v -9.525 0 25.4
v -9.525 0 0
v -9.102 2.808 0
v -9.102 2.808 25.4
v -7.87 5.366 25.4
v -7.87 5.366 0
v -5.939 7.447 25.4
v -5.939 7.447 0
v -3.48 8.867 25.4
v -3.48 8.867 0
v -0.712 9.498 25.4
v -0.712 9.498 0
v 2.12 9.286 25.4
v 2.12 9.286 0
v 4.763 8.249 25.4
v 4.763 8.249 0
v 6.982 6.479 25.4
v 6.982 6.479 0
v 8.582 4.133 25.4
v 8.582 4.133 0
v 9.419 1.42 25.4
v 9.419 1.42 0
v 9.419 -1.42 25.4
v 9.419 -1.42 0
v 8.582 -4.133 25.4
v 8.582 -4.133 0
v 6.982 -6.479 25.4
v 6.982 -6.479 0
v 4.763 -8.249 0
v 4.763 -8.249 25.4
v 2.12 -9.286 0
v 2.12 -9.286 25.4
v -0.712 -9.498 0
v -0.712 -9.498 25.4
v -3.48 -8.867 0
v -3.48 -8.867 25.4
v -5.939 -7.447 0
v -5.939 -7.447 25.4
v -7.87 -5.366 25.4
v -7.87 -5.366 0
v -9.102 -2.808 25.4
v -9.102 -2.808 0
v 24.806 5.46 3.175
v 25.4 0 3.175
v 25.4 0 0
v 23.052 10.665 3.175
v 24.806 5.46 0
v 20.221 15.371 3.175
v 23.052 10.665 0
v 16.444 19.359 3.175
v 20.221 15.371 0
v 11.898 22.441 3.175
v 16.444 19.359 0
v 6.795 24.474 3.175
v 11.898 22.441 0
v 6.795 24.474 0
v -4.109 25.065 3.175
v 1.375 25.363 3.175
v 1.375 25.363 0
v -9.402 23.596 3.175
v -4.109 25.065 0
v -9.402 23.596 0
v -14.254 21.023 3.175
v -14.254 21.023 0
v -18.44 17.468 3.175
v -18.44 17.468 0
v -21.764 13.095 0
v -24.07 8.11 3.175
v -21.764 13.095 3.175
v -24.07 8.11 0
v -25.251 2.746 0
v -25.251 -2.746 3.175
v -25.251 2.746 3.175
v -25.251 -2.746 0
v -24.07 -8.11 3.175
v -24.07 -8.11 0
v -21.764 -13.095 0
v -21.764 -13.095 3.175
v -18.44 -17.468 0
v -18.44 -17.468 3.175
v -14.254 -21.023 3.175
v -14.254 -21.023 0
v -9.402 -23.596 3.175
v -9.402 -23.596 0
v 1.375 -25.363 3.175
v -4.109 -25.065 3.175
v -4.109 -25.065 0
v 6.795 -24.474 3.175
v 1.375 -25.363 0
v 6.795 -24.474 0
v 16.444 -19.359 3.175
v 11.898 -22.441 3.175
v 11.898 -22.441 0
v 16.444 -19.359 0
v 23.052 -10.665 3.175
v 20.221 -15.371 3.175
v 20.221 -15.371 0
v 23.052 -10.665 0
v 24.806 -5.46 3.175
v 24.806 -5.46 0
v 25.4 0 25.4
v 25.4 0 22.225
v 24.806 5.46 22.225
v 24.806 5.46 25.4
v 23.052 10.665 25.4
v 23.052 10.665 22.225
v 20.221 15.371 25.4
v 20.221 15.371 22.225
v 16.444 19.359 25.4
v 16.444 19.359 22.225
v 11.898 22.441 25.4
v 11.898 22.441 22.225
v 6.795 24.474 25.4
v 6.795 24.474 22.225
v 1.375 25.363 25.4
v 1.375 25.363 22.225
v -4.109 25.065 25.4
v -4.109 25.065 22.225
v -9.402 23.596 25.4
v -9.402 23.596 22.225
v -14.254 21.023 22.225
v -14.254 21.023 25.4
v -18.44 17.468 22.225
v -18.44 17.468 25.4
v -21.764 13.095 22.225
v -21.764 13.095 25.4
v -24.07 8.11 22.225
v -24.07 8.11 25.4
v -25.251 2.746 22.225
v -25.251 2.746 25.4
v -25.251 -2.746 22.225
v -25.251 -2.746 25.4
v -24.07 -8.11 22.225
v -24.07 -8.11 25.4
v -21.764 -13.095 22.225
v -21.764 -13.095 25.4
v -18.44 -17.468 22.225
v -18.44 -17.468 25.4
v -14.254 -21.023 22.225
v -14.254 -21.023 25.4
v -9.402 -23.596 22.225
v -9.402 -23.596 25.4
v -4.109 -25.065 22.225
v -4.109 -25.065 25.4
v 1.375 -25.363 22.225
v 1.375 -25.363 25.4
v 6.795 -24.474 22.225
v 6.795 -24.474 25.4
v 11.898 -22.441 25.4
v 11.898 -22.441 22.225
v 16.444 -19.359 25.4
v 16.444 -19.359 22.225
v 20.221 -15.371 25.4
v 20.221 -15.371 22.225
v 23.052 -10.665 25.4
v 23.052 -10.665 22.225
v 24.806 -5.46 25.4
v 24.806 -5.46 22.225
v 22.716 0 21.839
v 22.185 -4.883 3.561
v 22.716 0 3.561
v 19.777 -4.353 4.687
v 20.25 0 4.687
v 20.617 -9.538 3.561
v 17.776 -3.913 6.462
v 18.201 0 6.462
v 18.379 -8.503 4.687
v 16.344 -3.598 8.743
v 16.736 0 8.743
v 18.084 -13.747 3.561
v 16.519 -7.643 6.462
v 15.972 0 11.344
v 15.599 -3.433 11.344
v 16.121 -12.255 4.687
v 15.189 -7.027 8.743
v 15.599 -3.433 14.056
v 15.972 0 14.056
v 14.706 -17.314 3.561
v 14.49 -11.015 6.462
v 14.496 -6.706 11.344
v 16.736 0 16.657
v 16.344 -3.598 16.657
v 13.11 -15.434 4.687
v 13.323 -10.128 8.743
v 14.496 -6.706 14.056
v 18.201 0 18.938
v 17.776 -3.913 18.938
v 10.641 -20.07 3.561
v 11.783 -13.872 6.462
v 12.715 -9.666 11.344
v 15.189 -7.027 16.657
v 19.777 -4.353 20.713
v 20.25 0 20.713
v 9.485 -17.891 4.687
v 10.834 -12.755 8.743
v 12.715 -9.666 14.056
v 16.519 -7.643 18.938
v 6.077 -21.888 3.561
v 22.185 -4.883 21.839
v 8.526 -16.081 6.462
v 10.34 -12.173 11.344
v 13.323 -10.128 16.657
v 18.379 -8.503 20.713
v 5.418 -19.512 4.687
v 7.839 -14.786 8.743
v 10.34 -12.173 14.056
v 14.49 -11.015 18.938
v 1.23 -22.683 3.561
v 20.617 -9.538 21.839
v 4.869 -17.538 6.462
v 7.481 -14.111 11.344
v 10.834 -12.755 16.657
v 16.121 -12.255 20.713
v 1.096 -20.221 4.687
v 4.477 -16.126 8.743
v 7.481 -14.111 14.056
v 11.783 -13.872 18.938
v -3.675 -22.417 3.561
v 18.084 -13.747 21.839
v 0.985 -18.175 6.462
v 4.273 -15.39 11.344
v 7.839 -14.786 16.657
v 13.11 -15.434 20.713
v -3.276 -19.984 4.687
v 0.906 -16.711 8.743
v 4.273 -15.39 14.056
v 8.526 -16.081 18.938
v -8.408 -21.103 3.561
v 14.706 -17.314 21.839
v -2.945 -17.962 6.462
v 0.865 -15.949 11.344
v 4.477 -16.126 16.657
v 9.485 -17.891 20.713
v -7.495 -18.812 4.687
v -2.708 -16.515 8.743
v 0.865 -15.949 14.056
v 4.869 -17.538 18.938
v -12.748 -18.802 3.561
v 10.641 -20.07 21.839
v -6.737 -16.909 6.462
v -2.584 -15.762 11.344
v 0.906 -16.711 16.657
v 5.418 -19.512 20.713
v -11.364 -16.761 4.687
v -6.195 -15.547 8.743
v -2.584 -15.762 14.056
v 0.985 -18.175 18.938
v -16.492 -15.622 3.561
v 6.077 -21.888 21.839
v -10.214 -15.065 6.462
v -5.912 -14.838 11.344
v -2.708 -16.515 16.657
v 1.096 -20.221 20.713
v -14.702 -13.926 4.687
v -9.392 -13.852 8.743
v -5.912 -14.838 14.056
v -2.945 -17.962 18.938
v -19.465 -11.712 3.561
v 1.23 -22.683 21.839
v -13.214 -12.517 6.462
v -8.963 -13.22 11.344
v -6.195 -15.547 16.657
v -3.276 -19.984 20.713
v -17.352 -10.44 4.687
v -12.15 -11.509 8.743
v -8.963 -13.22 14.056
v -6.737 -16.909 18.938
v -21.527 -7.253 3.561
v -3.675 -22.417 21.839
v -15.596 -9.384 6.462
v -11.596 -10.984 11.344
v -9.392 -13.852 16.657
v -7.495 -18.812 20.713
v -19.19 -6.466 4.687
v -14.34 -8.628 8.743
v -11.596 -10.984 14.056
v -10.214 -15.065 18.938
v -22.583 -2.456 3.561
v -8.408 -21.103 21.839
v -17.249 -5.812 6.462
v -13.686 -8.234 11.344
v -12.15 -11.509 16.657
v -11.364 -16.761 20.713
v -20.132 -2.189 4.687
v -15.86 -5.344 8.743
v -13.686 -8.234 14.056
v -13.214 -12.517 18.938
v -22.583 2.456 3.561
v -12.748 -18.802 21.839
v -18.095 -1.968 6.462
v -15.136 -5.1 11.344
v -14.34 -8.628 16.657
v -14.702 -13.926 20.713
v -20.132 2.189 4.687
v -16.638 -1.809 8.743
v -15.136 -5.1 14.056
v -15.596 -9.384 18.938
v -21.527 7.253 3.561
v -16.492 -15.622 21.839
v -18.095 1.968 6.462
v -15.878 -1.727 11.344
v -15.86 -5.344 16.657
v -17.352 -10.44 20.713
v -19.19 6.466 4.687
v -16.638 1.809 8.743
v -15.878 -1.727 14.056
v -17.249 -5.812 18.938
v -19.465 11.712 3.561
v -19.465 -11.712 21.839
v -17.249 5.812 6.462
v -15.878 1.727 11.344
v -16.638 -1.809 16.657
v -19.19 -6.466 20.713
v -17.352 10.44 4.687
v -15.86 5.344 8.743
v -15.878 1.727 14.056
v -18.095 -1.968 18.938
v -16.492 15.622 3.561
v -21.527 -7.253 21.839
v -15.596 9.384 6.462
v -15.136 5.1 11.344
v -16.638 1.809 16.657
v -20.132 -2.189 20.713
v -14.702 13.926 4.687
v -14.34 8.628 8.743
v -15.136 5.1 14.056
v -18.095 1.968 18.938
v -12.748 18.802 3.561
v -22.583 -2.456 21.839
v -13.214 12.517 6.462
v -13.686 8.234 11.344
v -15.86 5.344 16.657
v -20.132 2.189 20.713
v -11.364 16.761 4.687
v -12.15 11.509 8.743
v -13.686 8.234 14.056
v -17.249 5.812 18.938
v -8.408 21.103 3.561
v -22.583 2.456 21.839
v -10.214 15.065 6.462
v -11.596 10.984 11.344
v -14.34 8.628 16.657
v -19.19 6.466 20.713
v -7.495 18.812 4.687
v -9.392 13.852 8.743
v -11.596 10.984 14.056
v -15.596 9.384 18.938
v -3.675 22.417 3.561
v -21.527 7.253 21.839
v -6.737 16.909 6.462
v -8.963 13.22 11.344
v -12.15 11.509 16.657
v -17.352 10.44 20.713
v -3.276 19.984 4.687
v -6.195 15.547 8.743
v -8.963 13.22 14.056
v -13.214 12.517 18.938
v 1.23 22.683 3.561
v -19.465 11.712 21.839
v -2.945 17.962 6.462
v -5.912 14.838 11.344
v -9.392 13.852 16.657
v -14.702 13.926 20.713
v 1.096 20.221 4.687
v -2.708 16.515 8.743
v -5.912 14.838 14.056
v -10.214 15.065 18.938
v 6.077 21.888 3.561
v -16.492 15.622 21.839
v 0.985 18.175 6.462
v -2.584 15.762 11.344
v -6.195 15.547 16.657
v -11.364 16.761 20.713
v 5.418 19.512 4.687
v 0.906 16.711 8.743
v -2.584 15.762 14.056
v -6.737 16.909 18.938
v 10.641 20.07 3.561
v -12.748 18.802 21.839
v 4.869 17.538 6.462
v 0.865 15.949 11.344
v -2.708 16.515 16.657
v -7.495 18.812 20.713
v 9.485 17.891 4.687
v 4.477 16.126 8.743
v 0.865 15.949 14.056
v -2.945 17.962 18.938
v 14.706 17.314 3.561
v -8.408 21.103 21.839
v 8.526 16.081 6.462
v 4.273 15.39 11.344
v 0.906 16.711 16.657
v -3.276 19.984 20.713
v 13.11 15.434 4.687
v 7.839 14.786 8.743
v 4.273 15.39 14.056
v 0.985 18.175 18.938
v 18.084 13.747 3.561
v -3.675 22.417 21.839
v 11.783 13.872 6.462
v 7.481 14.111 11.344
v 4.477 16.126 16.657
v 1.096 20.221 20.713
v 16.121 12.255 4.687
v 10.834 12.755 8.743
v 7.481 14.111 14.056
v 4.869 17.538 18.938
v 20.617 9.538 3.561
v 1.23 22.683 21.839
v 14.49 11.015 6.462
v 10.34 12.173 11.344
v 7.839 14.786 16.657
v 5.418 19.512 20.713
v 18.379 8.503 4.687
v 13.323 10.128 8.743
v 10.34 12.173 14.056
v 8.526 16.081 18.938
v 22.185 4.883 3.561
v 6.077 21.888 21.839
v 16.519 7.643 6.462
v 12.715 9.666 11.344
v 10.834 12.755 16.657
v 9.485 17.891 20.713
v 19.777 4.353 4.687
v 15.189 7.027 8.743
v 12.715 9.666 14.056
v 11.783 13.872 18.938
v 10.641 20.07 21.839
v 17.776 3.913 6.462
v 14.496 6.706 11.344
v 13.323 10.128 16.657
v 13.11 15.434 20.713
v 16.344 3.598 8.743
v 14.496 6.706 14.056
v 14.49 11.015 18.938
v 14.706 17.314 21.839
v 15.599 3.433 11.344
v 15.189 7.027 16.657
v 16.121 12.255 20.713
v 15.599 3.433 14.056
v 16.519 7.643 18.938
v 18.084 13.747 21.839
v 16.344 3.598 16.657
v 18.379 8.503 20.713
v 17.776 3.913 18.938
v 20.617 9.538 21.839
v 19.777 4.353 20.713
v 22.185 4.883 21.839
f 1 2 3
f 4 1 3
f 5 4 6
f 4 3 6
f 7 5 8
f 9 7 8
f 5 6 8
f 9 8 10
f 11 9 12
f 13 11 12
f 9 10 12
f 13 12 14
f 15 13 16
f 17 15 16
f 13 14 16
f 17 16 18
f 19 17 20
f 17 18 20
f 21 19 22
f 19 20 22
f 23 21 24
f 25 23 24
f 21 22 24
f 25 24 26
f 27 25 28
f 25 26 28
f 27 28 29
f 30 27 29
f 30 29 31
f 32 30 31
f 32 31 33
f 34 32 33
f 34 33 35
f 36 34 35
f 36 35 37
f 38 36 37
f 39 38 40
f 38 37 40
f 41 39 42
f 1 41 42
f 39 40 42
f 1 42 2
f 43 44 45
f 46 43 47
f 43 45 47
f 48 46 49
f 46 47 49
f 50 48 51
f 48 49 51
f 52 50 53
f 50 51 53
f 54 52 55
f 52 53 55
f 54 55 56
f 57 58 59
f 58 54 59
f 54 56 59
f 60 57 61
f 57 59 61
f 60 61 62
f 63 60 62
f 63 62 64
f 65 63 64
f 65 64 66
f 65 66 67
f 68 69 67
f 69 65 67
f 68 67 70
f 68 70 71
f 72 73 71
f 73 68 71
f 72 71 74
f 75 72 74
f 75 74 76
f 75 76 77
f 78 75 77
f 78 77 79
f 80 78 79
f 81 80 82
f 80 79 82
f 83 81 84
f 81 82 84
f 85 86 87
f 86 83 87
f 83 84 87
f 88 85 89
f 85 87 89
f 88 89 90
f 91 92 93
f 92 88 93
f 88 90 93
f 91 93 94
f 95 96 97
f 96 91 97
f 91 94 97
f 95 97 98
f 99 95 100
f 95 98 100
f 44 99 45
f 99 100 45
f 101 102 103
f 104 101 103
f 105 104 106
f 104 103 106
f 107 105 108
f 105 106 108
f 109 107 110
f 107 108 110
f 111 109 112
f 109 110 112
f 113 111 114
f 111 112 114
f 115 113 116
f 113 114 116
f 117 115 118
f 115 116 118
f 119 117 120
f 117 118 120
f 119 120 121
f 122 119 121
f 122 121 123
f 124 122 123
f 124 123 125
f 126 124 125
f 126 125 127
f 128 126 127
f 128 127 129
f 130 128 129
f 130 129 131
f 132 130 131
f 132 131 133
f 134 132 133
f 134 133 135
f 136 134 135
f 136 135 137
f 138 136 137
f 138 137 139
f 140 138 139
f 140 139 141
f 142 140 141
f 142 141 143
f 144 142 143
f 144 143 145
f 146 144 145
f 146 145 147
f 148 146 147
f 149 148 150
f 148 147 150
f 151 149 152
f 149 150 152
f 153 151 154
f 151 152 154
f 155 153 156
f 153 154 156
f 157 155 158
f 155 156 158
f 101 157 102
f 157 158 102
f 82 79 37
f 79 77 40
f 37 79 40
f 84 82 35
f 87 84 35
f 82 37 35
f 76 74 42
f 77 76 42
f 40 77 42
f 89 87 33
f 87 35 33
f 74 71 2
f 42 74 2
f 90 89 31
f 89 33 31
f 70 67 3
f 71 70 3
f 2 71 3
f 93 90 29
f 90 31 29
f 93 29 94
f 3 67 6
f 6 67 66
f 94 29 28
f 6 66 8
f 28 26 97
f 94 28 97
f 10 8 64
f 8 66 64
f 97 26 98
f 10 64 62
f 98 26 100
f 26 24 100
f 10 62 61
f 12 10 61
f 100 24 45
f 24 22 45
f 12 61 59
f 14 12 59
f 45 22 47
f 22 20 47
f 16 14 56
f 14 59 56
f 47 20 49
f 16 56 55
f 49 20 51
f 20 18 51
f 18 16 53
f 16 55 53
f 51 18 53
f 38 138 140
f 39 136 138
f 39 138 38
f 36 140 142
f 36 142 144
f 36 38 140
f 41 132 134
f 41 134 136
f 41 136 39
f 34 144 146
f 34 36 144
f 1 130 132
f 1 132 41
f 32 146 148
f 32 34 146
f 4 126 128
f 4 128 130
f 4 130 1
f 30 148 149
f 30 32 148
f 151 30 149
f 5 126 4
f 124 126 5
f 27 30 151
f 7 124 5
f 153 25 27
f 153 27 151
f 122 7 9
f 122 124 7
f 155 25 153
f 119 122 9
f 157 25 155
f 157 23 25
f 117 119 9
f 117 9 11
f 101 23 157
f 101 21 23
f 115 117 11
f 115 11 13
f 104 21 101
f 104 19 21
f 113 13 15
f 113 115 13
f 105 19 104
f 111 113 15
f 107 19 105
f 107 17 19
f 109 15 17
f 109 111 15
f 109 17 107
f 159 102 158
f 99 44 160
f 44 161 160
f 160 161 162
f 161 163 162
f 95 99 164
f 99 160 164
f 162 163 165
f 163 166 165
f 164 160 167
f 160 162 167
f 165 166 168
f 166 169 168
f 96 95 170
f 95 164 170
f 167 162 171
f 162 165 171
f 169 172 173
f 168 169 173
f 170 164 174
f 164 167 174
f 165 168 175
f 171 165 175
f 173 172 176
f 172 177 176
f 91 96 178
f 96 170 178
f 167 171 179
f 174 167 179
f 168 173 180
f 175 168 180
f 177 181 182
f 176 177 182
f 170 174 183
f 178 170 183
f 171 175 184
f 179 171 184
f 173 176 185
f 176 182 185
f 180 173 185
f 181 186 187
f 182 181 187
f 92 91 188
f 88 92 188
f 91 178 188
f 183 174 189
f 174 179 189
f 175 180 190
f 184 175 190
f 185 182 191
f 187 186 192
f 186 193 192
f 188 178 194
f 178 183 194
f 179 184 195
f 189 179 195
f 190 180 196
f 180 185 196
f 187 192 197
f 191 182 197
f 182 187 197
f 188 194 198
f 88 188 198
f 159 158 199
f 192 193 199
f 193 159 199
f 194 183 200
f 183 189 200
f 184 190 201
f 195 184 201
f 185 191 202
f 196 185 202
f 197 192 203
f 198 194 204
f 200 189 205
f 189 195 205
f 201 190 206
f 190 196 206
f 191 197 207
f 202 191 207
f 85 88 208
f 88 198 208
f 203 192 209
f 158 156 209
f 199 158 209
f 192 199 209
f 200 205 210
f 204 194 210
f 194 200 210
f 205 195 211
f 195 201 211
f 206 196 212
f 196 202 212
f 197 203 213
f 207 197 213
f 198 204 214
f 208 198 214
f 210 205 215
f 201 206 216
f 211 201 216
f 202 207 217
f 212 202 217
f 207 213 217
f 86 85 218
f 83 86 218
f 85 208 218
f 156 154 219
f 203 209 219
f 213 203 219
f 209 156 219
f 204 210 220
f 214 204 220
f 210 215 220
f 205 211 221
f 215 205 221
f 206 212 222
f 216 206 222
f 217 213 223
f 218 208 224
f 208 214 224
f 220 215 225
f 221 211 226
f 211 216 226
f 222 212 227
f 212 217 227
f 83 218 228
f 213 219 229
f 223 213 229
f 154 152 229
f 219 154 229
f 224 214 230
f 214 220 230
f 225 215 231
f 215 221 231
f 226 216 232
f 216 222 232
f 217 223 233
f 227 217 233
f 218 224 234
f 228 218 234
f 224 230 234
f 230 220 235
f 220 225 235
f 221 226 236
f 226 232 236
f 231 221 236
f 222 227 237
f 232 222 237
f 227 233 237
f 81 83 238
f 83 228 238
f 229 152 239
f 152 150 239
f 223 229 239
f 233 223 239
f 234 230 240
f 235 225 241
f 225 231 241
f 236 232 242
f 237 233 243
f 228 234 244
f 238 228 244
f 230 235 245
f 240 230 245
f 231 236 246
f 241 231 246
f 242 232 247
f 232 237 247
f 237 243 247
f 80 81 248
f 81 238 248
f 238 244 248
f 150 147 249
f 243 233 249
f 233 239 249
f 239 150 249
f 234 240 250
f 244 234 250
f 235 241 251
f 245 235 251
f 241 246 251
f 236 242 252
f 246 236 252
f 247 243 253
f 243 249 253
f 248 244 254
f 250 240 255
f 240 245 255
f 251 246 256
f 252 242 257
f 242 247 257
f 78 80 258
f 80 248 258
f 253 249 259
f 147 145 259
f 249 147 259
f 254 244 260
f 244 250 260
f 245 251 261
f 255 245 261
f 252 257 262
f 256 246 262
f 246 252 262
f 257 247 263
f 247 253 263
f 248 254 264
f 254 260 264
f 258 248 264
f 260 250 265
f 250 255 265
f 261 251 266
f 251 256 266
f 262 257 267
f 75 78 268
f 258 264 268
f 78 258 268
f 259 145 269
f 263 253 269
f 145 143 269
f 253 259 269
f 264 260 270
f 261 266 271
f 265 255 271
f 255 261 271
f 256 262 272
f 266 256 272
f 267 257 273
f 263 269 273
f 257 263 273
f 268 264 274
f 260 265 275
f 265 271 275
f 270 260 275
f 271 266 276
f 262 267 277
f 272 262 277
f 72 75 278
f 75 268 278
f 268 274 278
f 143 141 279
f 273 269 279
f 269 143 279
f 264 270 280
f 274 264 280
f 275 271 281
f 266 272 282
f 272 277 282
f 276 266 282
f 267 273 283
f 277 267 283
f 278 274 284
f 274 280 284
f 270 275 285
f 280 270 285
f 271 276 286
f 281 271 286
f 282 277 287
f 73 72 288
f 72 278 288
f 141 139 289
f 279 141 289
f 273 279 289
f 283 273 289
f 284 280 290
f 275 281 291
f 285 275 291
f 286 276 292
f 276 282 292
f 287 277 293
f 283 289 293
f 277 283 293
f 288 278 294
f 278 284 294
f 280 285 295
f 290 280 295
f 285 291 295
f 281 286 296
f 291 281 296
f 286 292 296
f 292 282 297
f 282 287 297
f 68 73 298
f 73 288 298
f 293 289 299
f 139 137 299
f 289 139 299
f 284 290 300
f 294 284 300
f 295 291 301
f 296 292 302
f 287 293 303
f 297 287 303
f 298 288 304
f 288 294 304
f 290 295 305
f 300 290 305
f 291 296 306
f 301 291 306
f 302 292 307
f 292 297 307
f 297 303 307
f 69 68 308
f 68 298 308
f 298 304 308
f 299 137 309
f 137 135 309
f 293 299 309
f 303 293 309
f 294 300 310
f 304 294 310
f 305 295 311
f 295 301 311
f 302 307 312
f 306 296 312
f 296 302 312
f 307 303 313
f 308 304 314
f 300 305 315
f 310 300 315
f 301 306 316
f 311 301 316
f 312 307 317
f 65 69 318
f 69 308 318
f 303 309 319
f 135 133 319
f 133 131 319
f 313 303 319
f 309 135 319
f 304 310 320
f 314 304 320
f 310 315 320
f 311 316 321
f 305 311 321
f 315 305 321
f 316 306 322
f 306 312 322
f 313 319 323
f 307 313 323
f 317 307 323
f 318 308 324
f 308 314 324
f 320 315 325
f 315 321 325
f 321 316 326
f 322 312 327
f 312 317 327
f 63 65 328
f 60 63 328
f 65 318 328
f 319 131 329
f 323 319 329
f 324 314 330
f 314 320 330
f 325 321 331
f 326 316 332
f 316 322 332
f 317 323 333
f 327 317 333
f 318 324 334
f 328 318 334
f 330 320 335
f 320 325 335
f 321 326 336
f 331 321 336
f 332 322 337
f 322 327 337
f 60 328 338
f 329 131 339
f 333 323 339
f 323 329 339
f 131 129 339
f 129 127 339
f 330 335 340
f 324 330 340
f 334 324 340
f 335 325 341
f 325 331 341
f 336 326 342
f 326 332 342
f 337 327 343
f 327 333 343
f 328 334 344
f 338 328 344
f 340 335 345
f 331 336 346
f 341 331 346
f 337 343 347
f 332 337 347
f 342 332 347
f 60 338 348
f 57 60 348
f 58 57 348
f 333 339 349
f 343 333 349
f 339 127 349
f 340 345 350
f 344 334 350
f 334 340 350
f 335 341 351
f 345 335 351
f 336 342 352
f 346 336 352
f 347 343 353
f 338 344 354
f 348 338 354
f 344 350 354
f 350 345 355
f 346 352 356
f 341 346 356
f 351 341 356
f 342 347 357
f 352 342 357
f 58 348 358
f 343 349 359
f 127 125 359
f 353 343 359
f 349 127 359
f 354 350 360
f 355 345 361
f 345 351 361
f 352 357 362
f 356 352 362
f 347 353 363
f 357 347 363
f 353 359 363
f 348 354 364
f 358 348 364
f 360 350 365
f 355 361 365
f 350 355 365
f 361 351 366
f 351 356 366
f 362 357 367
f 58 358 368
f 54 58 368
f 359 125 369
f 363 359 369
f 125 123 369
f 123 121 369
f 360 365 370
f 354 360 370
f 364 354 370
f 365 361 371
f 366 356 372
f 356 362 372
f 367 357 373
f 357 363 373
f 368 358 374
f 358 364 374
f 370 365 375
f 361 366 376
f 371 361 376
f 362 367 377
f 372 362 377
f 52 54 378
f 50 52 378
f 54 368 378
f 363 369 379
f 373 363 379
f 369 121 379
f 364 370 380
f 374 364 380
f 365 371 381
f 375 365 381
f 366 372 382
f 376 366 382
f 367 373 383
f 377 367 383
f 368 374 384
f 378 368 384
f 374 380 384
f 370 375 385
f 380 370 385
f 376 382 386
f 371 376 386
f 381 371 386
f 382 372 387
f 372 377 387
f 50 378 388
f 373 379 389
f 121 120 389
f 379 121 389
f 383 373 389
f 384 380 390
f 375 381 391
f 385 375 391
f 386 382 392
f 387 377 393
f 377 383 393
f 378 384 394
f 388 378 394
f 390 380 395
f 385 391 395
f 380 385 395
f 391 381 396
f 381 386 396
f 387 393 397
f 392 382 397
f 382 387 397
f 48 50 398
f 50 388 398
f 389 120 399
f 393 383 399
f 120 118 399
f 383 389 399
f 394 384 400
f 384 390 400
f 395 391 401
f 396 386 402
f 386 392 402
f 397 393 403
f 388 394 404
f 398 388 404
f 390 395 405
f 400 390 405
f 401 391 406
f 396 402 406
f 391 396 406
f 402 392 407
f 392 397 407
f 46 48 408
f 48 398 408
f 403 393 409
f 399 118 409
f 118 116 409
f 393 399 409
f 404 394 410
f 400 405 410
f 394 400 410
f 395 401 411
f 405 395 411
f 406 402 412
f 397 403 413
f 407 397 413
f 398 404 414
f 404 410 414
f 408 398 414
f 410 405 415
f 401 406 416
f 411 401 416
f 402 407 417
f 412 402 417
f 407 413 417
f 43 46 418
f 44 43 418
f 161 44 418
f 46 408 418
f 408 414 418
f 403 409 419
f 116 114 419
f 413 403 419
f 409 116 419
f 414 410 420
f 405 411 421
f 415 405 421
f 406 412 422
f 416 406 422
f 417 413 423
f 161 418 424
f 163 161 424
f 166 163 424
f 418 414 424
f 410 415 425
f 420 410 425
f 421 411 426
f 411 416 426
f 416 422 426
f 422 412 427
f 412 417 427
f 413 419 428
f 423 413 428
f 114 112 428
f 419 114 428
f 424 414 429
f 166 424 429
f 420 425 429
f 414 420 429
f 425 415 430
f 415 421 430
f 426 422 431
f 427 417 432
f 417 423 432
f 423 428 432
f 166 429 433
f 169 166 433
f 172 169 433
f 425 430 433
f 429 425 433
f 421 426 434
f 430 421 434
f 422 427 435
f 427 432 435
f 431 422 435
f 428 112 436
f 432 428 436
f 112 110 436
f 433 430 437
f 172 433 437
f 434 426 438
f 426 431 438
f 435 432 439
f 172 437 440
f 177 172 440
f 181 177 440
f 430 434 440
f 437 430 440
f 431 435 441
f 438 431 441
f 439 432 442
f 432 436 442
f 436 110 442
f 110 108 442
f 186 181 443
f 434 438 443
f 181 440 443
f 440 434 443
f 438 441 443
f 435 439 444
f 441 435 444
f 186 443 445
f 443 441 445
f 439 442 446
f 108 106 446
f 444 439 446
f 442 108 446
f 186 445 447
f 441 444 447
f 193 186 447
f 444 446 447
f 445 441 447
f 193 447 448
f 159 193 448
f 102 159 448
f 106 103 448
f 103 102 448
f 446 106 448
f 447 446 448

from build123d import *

# Parameters (mm, degrees)
SKETCH1_R           = 25.4
BOSS_EXTRUDE1_DEPTH = 25.4
SKETCH3_R           = 9.525
CUT_EXTRUDE1_DEPTH  = 25.4


with BuildPart() as part:
    # Sketch1 → Boss-Extrude1 (new body)
    with BuildSketch(Plane.XY):
        Circle(SKETCH1_R)
    extrude(amount=BOSS_EXTRUDE1_DEPTH)

    # Sketch2 → Cut-Revolve1 (revolve, cut)
    with BuildSketch(Plane(origin=(0, 0, 0), x_dir=(1, 0, 0), z_dir=(0, 1, 0))):
        with BuildLine():
            Line((25.4, -22.225), (25.4, -3.175))
            ThreePointArc((25.4, -3.175), (15.875, -12.7), (25.4, -22.225))
        make_face()
    revolve(axis=Axis((0, 0, 32.071065699), (0, 0, -1)), mode=Mode.SUBTRACT)

    # Sketch3 → Cut-Extrude1 (cut)
    with BuildSketch(Plane(origin=(0, 0, 0), x_dir=(-1, 0, 0), z_dir=(0, 0, -1))):
        Circle(SKETCH3_R)
    extrude(amount=-CUT_EXTRUDE1_DEPTH, mode=Mode.SUBTRACT)


solid = part.part
